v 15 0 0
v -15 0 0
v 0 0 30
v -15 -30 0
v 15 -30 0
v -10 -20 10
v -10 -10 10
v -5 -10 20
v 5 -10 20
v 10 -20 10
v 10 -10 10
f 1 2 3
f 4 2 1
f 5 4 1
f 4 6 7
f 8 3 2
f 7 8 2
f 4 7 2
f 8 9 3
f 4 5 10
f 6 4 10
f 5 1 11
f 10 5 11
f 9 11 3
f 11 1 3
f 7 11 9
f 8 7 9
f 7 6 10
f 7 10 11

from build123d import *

# Parameters (mm, degrees)
F1_DEPTH = 30
F3_DEPTH = 15


with BuildPart() as f1:
    # F0 (on Front) → F1 (new body)
    with BuildSketch(Plane.XZ):
        Polygon((0, 30), (-15, 0), (15, 0), align=None)
    extrude(amount=F1_DEPTH)

    # F2 (on Right) → F3 (cut, symmetric)
    with BuildSketch(Plane.YZ):
        Polygon((0, 30), (-30, 30), (-30, 0), (-20, 10), (-20, 20), (-10, 20), align=None)
        Polygon((-20, 10), (-10, 20), (-20, 20), align=None)
        Polygon((-10, 10), (-10, 20), (-20, 10), align=None)
    extrude(amount=F3_DEPTH, both=True, mode=Mode.SUBTRACT)


solid = f1.part
